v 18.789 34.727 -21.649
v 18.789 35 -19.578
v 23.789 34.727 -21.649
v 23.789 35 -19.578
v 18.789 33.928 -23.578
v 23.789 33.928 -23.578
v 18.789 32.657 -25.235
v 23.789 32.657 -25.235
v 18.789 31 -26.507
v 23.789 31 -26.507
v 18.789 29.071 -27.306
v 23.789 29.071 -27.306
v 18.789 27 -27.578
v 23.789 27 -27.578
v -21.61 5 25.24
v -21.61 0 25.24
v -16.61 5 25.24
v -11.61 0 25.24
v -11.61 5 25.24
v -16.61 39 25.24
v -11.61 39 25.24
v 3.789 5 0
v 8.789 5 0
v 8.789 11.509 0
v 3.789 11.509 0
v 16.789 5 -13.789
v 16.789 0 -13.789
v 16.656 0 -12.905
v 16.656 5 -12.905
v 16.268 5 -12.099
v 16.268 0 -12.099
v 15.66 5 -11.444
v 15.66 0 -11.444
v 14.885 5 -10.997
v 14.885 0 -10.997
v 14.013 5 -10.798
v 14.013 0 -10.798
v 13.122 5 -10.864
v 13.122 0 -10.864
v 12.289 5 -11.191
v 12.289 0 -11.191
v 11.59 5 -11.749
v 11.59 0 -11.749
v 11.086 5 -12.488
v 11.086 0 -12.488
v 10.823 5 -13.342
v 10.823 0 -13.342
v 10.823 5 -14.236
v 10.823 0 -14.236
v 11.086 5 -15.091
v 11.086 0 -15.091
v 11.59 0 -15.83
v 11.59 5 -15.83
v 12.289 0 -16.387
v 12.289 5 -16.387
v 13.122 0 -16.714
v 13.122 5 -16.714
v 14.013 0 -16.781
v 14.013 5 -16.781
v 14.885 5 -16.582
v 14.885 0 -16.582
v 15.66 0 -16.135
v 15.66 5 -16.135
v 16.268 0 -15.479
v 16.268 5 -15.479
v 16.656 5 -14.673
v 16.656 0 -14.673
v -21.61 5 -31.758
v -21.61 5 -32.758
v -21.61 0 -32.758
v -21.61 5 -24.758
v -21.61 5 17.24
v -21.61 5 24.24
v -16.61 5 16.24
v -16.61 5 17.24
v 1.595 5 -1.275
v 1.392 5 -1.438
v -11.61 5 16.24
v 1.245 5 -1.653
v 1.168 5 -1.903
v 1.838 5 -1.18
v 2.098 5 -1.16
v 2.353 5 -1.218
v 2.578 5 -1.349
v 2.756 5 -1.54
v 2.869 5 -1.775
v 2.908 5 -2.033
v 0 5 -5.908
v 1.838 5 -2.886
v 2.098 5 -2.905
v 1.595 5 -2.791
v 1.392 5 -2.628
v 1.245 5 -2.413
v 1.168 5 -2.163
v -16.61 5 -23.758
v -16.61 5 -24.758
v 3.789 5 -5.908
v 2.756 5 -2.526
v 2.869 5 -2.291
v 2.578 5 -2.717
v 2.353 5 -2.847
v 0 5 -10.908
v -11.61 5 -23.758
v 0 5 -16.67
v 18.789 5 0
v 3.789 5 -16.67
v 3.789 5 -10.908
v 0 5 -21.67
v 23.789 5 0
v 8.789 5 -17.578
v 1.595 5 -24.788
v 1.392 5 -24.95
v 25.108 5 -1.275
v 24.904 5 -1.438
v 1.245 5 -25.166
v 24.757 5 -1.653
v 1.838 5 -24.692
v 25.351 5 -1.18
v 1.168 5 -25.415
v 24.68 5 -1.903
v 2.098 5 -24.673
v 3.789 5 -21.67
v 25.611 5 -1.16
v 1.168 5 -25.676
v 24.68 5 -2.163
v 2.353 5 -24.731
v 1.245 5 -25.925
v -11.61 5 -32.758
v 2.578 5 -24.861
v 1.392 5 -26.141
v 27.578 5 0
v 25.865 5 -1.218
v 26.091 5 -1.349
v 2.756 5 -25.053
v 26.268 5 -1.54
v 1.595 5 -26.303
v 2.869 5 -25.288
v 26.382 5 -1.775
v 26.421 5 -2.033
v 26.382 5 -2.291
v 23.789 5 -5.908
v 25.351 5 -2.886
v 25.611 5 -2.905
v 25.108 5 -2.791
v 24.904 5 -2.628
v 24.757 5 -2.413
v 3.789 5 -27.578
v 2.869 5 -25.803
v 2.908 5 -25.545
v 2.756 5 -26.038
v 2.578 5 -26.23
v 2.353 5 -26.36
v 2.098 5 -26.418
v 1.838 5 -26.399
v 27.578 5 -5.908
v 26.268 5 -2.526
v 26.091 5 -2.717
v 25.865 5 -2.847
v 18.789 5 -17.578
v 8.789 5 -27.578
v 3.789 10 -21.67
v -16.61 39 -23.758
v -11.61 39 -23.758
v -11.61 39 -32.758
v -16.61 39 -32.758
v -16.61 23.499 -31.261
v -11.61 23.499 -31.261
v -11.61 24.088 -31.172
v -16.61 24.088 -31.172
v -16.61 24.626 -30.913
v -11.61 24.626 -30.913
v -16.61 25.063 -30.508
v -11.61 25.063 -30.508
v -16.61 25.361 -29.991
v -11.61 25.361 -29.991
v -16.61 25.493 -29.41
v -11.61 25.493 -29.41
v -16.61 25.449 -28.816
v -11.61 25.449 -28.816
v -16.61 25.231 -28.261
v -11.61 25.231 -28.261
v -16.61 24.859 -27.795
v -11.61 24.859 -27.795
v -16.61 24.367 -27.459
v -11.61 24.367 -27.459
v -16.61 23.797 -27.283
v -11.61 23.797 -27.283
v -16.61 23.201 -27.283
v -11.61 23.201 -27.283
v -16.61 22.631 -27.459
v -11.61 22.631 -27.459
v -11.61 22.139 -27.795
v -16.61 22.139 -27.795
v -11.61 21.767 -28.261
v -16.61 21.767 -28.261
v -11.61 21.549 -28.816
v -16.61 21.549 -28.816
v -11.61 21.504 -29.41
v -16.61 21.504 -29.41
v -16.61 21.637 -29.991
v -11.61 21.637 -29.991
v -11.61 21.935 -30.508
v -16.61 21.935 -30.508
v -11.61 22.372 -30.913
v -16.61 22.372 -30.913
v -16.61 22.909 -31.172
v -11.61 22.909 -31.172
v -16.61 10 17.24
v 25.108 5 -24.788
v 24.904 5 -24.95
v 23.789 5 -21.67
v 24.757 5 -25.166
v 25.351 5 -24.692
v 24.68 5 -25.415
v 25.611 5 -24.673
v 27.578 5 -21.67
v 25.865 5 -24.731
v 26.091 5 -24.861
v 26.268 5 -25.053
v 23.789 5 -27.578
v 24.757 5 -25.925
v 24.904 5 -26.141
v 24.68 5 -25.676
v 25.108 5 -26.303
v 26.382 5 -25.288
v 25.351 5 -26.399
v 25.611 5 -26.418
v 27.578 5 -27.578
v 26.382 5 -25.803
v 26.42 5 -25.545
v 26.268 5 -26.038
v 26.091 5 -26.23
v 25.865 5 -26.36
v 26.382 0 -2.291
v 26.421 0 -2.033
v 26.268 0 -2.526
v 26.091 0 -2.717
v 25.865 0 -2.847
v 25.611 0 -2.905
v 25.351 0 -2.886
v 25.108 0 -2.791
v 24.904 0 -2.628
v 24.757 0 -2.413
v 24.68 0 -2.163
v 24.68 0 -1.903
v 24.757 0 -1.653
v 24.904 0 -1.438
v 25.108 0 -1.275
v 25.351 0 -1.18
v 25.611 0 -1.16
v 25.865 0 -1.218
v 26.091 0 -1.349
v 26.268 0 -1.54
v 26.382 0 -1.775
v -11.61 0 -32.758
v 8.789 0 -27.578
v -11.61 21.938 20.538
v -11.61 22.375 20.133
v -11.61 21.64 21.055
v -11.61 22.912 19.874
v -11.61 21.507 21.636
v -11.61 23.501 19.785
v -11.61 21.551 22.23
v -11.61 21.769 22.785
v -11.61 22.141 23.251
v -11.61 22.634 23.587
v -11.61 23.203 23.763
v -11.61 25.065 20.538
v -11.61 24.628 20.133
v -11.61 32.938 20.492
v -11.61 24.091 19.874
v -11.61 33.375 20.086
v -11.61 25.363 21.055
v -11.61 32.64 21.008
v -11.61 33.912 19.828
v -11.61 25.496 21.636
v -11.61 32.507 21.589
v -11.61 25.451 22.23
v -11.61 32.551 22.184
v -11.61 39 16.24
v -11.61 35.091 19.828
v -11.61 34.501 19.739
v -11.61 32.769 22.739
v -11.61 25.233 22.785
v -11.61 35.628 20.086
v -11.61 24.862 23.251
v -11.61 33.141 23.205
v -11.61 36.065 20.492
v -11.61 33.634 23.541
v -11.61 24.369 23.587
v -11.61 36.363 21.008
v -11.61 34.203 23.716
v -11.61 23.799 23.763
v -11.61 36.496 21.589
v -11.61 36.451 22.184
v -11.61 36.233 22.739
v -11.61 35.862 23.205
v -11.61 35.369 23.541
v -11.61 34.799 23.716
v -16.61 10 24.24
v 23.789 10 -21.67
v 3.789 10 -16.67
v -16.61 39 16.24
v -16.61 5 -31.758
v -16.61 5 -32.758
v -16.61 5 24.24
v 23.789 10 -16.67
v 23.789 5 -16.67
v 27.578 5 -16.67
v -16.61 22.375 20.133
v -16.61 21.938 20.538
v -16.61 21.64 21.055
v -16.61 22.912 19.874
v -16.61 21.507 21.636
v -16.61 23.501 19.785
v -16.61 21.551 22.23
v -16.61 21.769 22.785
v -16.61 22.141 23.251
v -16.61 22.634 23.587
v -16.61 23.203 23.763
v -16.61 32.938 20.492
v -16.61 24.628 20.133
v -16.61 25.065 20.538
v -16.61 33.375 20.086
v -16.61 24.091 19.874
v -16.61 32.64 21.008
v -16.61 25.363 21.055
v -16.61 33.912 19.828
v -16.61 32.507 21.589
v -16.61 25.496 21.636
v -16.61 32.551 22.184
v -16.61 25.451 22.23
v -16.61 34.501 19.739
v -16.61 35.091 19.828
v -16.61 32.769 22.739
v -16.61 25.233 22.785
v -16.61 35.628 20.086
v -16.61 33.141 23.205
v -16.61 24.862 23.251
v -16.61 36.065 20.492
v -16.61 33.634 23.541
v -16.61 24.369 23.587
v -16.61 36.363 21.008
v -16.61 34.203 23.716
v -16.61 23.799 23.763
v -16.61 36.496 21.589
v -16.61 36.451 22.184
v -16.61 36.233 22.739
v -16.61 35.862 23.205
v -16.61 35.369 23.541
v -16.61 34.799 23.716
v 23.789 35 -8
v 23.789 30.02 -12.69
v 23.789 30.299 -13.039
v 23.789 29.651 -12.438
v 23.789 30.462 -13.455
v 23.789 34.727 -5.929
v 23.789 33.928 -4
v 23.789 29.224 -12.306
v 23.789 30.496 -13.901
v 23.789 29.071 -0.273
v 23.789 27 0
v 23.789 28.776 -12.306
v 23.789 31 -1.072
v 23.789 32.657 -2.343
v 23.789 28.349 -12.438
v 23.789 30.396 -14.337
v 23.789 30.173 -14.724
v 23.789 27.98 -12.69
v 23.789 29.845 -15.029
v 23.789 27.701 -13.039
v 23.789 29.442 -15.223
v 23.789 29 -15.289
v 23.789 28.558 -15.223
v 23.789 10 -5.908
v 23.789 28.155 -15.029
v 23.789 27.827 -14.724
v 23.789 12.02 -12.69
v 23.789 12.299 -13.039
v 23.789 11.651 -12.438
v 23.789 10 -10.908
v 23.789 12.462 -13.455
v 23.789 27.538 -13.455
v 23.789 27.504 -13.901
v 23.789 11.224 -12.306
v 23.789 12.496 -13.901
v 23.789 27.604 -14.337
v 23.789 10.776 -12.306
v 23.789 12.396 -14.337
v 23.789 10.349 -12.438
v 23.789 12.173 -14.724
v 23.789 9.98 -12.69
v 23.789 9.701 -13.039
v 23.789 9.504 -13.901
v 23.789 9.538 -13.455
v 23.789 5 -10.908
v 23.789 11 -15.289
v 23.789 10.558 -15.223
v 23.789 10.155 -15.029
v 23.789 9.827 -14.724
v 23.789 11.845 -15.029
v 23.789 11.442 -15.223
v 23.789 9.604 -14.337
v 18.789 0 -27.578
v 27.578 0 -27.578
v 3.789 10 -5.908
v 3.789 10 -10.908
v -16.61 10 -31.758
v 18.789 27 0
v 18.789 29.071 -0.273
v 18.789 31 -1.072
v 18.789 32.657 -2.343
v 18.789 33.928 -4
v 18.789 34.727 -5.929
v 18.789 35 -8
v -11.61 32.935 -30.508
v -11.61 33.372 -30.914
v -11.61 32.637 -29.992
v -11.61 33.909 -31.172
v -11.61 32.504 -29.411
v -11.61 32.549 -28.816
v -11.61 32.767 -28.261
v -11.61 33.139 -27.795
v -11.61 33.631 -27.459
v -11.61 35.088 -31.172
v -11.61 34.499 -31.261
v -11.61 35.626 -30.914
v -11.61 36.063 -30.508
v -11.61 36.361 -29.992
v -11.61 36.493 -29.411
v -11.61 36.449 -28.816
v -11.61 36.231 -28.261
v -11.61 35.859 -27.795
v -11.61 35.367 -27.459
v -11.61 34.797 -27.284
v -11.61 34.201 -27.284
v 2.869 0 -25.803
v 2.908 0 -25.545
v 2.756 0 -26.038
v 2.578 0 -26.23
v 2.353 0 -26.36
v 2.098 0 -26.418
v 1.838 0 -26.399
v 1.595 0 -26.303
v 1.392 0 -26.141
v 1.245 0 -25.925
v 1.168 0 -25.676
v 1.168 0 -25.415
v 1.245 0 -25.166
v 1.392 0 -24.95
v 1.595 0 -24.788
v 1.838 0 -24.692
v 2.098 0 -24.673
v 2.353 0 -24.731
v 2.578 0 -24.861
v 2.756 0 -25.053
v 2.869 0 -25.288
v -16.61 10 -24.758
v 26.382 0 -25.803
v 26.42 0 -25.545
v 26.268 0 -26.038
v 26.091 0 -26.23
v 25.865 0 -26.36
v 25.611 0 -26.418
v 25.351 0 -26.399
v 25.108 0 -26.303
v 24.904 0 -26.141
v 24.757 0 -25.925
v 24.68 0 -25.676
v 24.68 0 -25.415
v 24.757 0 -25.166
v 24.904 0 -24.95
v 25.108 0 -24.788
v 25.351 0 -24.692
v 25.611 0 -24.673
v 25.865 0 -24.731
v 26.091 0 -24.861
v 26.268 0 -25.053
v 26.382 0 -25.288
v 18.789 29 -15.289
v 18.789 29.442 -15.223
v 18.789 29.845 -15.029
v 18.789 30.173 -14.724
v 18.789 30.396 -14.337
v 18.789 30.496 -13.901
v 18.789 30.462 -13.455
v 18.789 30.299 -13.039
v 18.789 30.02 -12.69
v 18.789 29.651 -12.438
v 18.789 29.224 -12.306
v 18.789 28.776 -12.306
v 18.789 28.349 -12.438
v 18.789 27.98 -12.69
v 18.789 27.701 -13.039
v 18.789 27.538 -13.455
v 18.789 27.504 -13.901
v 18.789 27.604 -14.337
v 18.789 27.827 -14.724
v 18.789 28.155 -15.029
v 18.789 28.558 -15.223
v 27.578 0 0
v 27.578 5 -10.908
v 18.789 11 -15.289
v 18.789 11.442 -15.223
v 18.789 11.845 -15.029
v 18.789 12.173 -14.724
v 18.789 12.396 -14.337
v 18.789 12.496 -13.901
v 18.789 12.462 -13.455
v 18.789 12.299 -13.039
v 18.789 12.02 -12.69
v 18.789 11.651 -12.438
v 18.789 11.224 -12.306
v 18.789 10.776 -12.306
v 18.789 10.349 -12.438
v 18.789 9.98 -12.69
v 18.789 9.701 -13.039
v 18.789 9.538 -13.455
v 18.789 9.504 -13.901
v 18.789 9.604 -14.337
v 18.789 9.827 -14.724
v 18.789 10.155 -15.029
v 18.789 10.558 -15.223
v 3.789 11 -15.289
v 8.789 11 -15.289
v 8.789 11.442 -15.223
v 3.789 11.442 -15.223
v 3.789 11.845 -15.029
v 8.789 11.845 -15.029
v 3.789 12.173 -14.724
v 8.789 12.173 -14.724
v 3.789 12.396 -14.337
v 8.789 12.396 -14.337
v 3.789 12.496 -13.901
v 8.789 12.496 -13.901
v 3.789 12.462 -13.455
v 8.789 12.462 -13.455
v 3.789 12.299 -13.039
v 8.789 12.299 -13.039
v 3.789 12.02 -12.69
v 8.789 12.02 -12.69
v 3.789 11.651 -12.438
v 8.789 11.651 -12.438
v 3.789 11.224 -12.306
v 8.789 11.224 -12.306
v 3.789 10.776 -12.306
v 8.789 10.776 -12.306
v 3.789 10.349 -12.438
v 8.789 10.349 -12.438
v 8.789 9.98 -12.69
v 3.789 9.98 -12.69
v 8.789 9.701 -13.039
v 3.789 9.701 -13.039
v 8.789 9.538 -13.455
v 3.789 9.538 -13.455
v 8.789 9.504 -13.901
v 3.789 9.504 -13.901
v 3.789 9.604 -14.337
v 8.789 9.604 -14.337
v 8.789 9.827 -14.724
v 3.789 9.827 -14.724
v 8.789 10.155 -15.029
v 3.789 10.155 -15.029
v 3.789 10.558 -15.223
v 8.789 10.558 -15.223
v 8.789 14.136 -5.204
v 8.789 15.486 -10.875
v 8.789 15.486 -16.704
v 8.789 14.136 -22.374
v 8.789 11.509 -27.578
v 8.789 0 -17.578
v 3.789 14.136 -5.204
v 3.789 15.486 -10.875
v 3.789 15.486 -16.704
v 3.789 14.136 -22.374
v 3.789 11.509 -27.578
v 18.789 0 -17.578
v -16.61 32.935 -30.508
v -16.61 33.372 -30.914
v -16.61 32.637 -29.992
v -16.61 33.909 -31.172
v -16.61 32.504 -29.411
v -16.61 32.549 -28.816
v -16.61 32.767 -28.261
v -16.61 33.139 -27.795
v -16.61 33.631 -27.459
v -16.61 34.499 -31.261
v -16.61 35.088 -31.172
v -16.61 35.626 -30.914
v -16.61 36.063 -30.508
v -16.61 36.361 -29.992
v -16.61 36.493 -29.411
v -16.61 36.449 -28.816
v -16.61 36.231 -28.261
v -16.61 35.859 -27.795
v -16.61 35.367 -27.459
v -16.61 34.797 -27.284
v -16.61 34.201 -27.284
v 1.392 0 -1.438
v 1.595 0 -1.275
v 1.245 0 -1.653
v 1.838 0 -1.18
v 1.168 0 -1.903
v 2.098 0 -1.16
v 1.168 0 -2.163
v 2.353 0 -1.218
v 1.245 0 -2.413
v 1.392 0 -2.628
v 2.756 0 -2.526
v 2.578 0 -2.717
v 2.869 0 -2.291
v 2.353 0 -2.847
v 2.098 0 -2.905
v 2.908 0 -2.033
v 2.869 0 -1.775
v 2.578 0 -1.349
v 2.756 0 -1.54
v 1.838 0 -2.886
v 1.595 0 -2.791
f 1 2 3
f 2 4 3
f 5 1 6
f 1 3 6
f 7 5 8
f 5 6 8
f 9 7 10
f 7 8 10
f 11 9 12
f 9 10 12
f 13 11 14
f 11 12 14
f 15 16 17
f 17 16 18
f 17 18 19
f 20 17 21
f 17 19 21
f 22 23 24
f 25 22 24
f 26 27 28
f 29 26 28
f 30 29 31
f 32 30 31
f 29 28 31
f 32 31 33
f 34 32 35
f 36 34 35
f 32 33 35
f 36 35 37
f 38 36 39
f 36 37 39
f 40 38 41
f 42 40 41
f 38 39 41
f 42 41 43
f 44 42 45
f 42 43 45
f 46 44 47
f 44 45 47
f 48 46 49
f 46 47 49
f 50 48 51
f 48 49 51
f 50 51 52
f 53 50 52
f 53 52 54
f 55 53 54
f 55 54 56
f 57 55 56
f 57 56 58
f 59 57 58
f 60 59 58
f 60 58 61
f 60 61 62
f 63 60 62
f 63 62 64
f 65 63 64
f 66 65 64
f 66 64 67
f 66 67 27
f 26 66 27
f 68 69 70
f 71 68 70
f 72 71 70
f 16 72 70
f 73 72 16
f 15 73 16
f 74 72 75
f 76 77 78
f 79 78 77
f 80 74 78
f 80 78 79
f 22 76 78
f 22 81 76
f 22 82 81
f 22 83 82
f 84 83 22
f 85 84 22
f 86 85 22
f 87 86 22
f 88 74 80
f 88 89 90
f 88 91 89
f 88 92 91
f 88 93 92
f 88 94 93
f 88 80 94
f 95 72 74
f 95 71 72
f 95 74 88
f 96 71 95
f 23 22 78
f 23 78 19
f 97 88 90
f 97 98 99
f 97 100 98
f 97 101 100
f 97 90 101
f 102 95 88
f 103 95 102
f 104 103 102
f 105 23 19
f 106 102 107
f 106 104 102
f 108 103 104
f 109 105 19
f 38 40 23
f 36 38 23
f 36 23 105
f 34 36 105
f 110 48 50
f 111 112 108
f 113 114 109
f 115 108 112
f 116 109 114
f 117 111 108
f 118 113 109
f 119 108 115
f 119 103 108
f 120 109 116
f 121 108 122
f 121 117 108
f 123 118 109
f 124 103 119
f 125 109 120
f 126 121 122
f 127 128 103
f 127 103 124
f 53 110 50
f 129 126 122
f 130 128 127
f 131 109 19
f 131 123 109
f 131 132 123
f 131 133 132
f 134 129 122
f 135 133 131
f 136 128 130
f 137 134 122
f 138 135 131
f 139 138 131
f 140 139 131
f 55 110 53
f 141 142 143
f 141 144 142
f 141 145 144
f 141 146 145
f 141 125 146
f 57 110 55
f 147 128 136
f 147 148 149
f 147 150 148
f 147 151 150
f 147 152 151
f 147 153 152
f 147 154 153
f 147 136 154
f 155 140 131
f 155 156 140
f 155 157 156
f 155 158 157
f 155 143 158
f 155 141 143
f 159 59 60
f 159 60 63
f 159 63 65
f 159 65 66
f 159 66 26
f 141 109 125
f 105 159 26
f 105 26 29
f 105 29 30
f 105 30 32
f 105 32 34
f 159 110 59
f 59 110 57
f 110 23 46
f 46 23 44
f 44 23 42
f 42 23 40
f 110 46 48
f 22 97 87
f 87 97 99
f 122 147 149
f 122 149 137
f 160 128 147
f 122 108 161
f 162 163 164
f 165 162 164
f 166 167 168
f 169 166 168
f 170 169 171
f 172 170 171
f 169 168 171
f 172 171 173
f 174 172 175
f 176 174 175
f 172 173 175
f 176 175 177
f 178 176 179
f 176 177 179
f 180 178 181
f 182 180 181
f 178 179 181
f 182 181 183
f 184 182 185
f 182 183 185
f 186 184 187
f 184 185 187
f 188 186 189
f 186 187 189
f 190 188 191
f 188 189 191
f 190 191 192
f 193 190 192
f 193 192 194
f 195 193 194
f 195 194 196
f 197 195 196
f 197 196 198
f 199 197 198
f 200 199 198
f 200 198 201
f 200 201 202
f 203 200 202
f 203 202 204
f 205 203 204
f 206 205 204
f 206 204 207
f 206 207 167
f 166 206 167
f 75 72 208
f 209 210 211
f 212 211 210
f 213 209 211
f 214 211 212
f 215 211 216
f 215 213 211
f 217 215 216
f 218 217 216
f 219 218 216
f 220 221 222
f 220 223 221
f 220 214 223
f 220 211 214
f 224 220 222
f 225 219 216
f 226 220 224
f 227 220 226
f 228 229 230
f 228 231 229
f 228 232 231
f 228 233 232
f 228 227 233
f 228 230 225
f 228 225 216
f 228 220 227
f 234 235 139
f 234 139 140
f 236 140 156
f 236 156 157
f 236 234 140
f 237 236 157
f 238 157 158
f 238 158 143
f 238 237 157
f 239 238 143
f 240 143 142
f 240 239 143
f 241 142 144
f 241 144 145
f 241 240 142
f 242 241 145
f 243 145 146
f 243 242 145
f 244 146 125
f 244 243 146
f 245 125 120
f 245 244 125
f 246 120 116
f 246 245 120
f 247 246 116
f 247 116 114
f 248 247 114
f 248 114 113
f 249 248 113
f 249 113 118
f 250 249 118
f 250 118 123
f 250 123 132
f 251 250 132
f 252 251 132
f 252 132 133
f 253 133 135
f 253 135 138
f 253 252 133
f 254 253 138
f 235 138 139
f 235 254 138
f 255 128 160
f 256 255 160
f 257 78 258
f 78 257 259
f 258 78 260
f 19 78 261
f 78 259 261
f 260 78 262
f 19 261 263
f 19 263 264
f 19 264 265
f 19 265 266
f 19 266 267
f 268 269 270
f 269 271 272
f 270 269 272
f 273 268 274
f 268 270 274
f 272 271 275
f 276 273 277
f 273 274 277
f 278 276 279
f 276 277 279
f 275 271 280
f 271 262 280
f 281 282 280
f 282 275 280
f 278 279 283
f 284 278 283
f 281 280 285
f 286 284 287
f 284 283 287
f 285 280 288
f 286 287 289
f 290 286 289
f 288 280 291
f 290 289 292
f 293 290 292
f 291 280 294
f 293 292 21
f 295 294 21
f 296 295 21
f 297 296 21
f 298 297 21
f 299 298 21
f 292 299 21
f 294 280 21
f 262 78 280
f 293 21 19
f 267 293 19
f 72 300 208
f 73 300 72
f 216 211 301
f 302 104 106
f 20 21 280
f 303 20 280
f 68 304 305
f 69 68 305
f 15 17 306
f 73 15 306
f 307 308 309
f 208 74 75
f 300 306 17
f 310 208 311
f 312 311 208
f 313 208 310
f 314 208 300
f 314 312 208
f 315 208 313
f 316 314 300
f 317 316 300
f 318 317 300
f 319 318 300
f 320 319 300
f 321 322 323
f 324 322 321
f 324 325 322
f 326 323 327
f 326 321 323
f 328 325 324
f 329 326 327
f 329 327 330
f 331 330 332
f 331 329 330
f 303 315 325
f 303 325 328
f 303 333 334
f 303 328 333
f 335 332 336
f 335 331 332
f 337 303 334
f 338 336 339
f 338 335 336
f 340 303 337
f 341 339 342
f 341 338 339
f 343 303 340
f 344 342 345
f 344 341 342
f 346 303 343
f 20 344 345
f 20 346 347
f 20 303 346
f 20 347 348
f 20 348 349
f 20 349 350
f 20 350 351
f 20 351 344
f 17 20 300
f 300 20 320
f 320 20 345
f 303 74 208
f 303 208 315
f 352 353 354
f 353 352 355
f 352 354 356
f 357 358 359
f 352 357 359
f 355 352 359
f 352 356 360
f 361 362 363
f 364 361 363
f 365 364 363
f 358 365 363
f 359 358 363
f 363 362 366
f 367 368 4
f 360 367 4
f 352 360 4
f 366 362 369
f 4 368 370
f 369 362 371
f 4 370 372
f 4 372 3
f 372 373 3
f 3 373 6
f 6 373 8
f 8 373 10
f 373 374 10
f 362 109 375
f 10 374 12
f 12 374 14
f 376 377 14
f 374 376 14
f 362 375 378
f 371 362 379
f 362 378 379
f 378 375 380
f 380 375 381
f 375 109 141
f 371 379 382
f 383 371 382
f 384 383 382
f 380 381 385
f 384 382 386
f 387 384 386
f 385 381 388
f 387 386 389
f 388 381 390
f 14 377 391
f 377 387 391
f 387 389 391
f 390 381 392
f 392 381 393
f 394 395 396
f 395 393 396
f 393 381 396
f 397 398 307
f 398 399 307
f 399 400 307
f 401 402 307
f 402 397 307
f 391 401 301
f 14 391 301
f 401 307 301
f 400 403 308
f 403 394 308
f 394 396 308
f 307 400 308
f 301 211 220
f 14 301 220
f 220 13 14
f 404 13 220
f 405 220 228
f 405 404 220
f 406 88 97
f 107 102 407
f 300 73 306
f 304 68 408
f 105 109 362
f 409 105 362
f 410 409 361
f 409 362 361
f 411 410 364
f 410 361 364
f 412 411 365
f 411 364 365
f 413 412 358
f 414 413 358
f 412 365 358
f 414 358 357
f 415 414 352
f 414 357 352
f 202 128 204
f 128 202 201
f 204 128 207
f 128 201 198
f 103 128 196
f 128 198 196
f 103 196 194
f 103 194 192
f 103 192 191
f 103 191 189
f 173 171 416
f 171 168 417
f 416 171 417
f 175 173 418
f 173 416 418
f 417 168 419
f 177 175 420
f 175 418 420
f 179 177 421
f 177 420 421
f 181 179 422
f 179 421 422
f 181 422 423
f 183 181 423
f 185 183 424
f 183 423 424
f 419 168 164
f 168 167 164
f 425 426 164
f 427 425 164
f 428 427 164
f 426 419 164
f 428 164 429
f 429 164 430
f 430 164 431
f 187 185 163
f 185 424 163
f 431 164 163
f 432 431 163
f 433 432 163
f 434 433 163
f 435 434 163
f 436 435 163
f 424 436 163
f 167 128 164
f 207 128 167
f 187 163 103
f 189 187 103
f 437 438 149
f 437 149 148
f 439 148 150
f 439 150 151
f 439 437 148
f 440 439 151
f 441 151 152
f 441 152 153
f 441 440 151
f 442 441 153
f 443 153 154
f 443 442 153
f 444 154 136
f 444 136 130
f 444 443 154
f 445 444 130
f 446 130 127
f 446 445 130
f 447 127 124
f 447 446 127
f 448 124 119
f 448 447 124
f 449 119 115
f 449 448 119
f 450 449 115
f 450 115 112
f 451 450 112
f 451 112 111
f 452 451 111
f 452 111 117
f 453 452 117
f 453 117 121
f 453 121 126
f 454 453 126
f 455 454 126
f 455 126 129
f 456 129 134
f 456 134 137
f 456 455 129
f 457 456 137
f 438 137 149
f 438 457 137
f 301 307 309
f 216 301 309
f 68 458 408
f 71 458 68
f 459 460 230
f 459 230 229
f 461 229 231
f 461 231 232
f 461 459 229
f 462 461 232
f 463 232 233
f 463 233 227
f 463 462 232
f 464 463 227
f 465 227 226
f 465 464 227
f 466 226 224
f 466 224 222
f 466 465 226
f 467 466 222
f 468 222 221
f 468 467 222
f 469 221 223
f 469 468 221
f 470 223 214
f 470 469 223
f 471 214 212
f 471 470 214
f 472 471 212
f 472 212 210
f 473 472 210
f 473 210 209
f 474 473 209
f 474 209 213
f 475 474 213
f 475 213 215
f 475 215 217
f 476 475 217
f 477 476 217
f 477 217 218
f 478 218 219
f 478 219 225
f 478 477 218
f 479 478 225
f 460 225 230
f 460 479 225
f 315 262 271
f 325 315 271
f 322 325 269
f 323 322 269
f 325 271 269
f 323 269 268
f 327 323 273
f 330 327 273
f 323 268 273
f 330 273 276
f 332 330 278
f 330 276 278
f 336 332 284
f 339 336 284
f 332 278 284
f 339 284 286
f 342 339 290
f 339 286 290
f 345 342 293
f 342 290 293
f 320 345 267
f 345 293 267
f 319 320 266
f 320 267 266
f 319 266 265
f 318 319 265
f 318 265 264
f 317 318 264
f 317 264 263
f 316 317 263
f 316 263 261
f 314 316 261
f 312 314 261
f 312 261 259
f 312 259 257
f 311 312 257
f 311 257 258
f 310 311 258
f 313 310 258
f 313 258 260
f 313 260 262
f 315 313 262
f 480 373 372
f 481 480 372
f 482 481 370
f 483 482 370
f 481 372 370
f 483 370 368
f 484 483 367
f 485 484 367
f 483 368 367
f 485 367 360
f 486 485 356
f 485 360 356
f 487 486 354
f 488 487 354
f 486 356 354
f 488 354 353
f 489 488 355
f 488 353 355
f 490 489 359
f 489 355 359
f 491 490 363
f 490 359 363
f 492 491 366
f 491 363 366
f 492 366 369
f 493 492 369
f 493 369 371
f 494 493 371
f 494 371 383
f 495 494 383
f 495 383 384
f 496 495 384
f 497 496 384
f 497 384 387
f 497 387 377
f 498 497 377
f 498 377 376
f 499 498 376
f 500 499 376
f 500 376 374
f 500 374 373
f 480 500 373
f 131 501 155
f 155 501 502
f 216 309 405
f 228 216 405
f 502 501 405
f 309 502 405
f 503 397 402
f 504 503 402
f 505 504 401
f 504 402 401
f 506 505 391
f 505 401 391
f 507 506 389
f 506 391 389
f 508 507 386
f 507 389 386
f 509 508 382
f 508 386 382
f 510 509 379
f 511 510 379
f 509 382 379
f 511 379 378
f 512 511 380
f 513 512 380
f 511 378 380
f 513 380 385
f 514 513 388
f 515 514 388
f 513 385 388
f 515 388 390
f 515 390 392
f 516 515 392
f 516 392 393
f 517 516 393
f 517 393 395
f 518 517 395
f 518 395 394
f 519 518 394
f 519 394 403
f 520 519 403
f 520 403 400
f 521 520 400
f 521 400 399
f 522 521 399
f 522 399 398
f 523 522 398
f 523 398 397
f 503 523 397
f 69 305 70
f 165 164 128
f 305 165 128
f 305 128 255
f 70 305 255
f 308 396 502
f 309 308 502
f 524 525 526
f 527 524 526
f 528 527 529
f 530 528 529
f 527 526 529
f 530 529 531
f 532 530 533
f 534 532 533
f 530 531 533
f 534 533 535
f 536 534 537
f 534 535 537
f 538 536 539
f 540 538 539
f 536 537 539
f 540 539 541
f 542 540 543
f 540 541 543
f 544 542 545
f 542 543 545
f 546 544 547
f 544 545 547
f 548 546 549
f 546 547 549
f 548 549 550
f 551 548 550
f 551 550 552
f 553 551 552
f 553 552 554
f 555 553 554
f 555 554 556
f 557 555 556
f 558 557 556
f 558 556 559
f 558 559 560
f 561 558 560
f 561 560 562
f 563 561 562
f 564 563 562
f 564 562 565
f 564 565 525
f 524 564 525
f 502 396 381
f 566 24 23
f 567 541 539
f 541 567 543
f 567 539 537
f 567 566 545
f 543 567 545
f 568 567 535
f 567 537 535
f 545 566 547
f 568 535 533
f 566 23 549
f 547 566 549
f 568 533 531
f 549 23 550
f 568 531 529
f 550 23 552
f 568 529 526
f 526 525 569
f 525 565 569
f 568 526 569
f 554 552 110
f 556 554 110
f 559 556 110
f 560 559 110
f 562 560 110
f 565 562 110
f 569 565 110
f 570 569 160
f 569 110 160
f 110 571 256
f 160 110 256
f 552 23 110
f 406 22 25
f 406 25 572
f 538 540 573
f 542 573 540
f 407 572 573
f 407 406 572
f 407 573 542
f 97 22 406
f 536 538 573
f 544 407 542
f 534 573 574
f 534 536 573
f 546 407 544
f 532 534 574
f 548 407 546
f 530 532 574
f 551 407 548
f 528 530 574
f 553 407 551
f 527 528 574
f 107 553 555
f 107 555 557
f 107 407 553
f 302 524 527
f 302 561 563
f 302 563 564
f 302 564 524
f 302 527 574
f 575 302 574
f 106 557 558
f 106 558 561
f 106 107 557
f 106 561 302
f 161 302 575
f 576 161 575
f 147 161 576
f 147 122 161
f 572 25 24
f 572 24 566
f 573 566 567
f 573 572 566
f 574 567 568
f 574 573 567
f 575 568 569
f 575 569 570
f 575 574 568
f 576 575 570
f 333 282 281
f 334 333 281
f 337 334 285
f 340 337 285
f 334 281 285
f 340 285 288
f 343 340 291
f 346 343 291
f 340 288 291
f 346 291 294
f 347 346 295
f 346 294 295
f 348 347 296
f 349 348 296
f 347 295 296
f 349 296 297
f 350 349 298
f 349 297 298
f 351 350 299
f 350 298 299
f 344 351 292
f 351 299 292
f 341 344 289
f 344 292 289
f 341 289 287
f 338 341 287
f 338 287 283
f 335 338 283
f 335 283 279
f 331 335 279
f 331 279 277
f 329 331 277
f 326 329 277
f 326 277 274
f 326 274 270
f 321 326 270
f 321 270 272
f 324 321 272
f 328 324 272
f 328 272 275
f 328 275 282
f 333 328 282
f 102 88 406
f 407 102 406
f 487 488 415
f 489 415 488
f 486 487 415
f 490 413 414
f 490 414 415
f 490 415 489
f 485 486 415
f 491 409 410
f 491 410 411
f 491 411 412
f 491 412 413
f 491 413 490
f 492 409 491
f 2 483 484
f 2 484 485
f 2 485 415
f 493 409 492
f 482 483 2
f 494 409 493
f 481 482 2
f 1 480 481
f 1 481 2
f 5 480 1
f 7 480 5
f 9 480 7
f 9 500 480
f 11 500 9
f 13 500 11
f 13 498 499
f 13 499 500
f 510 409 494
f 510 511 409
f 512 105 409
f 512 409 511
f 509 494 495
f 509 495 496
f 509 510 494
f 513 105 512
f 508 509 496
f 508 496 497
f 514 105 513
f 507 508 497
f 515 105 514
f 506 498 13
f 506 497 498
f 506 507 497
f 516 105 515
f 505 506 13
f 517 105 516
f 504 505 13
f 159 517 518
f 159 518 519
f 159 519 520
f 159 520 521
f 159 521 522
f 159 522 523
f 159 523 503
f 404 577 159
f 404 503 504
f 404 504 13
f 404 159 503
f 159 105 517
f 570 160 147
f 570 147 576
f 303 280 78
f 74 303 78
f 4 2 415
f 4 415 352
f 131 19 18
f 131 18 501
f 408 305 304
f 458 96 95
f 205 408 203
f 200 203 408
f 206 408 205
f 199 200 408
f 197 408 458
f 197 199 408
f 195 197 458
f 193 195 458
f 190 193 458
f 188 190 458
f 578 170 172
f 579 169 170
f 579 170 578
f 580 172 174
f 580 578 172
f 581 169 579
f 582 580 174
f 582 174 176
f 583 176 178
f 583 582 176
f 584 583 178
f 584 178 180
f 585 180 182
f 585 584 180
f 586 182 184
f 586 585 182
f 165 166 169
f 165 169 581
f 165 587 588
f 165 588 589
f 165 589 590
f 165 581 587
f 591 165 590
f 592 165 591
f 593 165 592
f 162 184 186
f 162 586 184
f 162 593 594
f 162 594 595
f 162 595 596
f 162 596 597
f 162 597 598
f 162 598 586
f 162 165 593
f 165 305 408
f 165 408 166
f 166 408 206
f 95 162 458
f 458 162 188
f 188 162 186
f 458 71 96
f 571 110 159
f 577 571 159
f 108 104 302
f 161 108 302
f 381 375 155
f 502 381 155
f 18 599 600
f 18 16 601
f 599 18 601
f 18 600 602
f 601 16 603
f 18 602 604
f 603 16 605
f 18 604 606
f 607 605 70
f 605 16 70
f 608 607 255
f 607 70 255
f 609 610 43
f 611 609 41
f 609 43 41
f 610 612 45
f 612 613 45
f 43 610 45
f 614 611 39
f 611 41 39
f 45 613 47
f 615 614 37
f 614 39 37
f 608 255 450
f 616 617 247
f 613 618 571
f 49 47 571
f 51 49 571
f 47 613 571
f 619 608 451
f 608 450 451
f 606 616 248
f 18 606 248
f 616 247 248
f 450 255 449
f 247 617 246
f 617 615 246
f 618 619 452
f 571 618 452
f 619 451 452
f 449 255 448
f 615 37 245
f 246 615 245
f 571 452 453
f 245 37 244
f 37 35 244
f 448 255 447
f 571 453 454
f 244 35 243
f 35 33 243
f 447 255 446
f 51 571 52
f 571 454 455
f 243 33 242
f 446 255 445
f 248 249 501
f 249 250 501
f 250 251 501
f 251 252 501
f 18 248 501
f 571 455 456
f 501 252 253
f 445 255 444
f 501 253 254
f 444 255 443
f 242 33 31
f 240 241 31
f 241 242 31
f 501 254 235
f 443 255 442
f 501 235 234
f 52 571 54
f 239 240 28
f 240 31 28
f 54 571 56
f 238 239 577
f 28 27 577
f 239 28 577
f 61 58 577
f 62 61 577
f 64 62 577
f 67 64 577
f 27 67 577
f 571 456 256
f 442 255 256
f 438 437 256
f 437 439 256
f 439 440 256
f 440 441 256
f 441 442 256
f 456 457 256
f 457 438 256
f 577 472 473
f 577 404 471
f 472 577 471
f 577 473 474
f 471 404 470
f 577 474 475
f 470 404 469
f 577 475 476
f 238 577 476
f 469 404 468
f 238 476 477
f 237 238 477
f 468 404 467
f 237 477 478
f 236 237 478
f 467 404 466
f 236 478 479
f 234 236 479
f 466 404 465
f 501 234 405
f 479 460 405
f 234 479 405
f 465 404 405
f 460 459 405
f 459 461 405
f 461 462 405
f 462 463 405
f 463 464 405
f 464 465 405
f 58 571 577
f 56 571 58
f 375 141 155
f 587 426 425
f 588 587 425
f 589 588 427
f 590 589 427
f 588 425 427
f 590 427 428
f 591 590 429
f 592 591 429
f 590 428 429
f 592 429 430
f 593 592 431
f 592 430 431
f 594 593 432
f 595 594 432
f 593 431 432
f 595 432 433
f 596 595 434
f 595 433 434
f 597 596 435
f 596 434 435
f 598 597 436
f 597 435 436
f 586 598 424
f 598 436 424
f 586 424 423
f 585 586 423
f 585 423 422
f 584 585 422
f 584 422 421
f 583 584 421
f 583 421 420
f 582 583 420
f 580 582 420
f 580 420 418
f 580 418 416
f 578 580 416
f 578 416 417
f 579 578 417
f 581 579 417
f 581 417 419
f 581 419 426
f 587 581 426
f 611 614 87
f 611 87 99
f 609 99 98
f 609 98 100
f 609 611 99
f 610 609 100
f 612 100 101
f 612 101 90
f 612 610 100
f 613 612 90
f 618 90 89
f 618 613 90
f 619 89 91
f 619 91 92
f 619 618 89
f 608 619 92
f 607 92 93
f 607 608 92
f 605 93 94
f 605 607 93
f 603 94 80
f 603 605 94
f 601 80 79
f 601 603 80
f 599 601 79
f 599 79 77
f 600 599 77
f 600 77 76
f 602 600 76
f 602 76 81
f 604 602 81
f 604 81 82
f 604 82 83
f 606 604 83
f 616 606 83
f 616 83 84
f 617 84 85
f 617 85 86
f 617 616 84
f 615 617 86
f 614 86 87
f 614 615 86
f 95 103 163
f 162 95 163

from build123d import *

# Parameters (mm, degrees)
SKETCH1_W            = 27.578431842
SKETCH1_H            = 27.578431842
SKETCH1_R            = 0.875
BOSS_EXTRUDE1_DEPTH  = 5
SKETCH2_W            = 5
SKETCH2_H            = 27.578431842
BOSS_EXTRUDE2_DEPTH  = 30
CUT_EXTRUDE2_DEPTH   = 10
SKETCH5_R            = 1.5
CUT_EXTRUDE3_DEPTH   = 24
FILLET1_R            = 8
FILLET2_R            = 8
SKETCH6_W            = 10
SKETCH6_H            = 10
CUT_EXTRUDE5_DEPTH   = 7
SKETCH7_R            = 3
CUT_EXTRUDE6_DEPTH   = 7
SKETCH8_W            = 3.789215921
SKETCH8_H            = 5
BOSS_EXTRUDE3_DEPTH  = 5
CUT_EXTRUDE7_DEPTH   = 25
SKETCH10_W           = 27.578431842
SKETCH10_H           = 5
BOSS_EXTRUDE4_DEPTH  = 11.61
BOSS_EXTRUDE5_DEPTH  = 5
BOSS_EXTRUDE9_DEPTH  = 5
SKETCH18_W           = 5
SKETCH18_H           = 7
BOSS_EXTRUDE10_DEPTH = 5
CUT_EXTRUDE9_DEPTH   = 59
SKETCH20_R           = 2
CUT_EXTRUDE10_DEPTH  = 10
BOSS_EXTRUDE11_DEPTH = 5


with BuildPart() as part:
    # Sketch1 → Boss-Extrude1 (new body)
    with BuildSketch(Plane(origin=(0, 0, 0), x_dir=(1, 0, 0), z_dir=(0, 1, 0))):
        with Locations((13.789215921, 13.789215921)):
            Rectangle(SKETCH1_W, SKETCH1_H)
        with Locations((2.032931996, 2.032931996)):
            Circle(SKETCH1_R, mode=Mode.SUBTRACT)
        with Locations((25.545499846, 25.545499846)):
            Circle(SKETCH1_R, mode=Mode.SUBTRACT)
        with Locations((2.032931996, 25.545499846)):
            Circle(SKETCH1_R, mode=Mode.SUBTRACT)
        with Locations((25.545513651, 2.032918191)):
            Circle(SKETCH1_R, mode=Mode.SUBTRACT)
    extrude(amount=BOSS_EXTRUDE1_DEPTH)

    # Sketch2 → Boss-Extrude2 (add)
    with BuildSketch(Plane(origin=(0, 5, 0), x_dir=(1, 0, 0), z_dir=(0, 1, 0))):
        with Locations((21.289215921, 13.789215921)):
            Rectangle(SKETCH2_W, SKETCH2_H)
        with Locations((6.289215921, 13.789215921)):
            Rectangle(SKETCH2_W, SKETCH2_H)
    extrude(amount=BOSS_EXTRUDE2_DEPTH)

    # Sketch4 → Cut-Extrude2 (cut)
    with BuildSketch(Plane.ZY.offset(-3.789215921)):
        with BuildLine():
            Line((-27.578431842, 11.509370995), (-27.578431842, 35))
            Line((-27.578431842, 35), (0, 35))
            Line((0, 35), (0, 11.509370995))
            ThreePointArc((0, 11.509370995), (-13.789215921, 15.656133254), (-27.578431842, 11.509370995))
        make_face()
    extrude(amount=-CUT_EXTRUDE2_DEPTH, mode=Mode.SUBTRACT)

    # Sketch5 → Cut-Extrude3 (cut)
    with BuildSketch(Plane(origin=(23.789215921, 0, 0), x_dir=(0, 0, -1), z_dir=(1, 0, 0))):
        with Locations((13.789215921, 29)):
            Circle(SKETCH5_R)
        with Locations((13.789215921, 11)):
            Circle(SKETCH5_R)
    extrude(amount=-CUT_EXTRUDE3_DEPTH, mode=Mode.SUBTRACT)

    # Fillet1
    fillet1_edges = [part.edges().sort_by_distance(p)[0] for p in [
        (21.289215921, 35, 0),
    ]]
    fillet(fillet1_edges, radius=FILLET1_R)

    # Fillet2
    fillet2_edges = [part.edges().sort_by_distance(p)[0] for p in [
        (21.289215921, 35, -27.578431842),
    ]]
    fillet(fillet2_edges, radius=FILLET2_R)

    # Sketch6 → Cut-Extrude5 (cut)
    with BuildSketch(Plane(origin=(0, 5, 0), x_dir=(1, 0, 0), z_dir=(0, 1, 0))):
        with Locations((13.789215921, 22.578431842)):
            Rectangle(SKETCH6_W, SKETCH6_H)
    extrude(amount=-CUT_EXTRUDE5_DEPTH, mode=Mode.SUBTRACT)

    # Sketch7 → Cut-Extrude6 (cut)
    with BuildSketch(Plane.XZ):
        with Locations((13.789215921, -13.789215921)):
            Circle(SKETCH7_R)
    extrude(amount=-CUT_EXTRUDE6_DEPTH, mode=Mode.SUBTRACT)

    # Sketch8 → Boss-Extrude3 (add)
    with BuildSketch(Plane(origin=(0, 5, 0), x_dir=(1, 0, 0), z_dir=(0, 1, 0))):
        with Locations((1.894607961, 19.170499846)):
            Rectangle(SKETCH8_W, SKETCH8_H)
        with Locations((25.683823882, 19.170499846)):
            Rectangle(SKETCH8_W, SKETCH8_H)
        with Locations((25.683823882, 8.407918191)):
            Rectangle(SKETCH8_W, SKETCH8_H)
        with Locations((1.894607961, 8.407918191)):
            Rectangle(SKETCH8_W, SKETCH8_H)
    extrude(amount=BOSS_EXTRUDE3_DEPTH)

    # Sketch9 → Cut-Extrude7 (cut)
    with BuildSketch(Plane.XY.offset(-5.907918191)):
        Polygon((0, 5), (3.789215921, 10), (0, 10), align=None)
        Polygon((23.789215921, 10), (27.578431842, 5), (27.578431842, 10), align=None)
    extrude(amount=-CUT_EXTRUDE7_DEPTH, mode=Mode.SUBTRACT)

    # Sketch10 → Boss-Extrude4 (add)
    with BuildSketch(Plane.ZY):
        with Locations((-13.789215921, 2.5)):
            Rectangle(SKETCH10_W, SKETCH10_H)
    extrude(amount=BOSS_EXTRUDE4_DEPTH)

    # Sketch11 → Boss-Extrude5 (add)
    with BuildSketch(Plane.ZY.offset(11.61)):
        Polygon((-32.758431842, 9.017116473), (-32.758431842, 0), (-27.578431842, 0), (0, 0), (25.24, 0), (25.24, 9.017116473), (25.24, 39), (16.24, 39), (16.24, 5), (0, 5), (-23.758431842, 5), (-23.758431842, 39), (-32.758431842, 39), align=None)
    extrude(amount=BOSS_EXTRUDE5_DEPTH)

    # Sketch17 → Boss-Extrude9 (add)
    with BuildSketch(Plane.ZY.offset(16.61)):
        Polygon((-23.758431842, 5), (-32.758431842, 5), (-32.758431842, 0), (25.24, 0), (25.24, 5), align=None)
    extrude(amount=BOSS_EXTRUDE9_DEPTH)

    # Sketch18 → Boss-Extrude10 (add)
    with BuildSketch(Plane(origin=(0, 5, 0), x_dir=(1, 0, 0), z_dir=(0, 1, 0))):
        with Locations((-19.11, 28.258431842)):
            Rectangle(SKETCH18_W, SKETCH18_H)
        with Locations((-19.11, -20.74)):
            Rectangle(SKETCH18_W, SKETCH18_H)
    extrude(amount=BOSS_EXTRUDE10_DEPTH)

    # Sketch19 → Cut-Extrude9 (cut)
    with BuildSketch(Plane.XY.offset(24.24)):
        Polygon((-21.61, 5), (-21.61, 10), (-16.61, 10), align=None)
    extrude(amount=-CUT_EXTRUDE9_DEPTH, mode=Mode.SUBTRACT)

    # Sketch20 → Cut-Extrude10 (cut)
    with BuildSketch(Plane(origin=(-11.61, 0, 0), x_dir=(0, 0, -1), z_dir=(1, 0, 0))):
        with Locations((-21.738681897, 34.501289775)):
            Circle(SKETCH20_R)
        with Locations((-21.785282729, 23.501291949)):
            Circle(SKETCH20_R)
        with Locations((29.260801868, 23.498896595)):
            Circle(SKETCH20_R)
        with Locations((29.261318047, 34.498896583)):
            Circle(SKETCH20_R)
    extrude(amount=-CUT_EXTRUDE10_DEPTH, mode=Mode.SUBTRACT)

    # Sketch21 → Boss-Extrude11 (add)
    with BuildSketch(Plane(origin=(0, 5, 0), x_dir=(1, 0, 0), z_dir=(0, 1, 0))):
        Polygon((-11.61, -25.24), (27.578431842, 0), (-11.61, 0), align=None)
        Polygon((-11.61, 32.758431842), (8.789215921, 27.578431842), (-11.61, 27.578431842), align=None)
    extrude(amount=-BOSS_EXTRUDE11_DEPTH)


solid = part.part
